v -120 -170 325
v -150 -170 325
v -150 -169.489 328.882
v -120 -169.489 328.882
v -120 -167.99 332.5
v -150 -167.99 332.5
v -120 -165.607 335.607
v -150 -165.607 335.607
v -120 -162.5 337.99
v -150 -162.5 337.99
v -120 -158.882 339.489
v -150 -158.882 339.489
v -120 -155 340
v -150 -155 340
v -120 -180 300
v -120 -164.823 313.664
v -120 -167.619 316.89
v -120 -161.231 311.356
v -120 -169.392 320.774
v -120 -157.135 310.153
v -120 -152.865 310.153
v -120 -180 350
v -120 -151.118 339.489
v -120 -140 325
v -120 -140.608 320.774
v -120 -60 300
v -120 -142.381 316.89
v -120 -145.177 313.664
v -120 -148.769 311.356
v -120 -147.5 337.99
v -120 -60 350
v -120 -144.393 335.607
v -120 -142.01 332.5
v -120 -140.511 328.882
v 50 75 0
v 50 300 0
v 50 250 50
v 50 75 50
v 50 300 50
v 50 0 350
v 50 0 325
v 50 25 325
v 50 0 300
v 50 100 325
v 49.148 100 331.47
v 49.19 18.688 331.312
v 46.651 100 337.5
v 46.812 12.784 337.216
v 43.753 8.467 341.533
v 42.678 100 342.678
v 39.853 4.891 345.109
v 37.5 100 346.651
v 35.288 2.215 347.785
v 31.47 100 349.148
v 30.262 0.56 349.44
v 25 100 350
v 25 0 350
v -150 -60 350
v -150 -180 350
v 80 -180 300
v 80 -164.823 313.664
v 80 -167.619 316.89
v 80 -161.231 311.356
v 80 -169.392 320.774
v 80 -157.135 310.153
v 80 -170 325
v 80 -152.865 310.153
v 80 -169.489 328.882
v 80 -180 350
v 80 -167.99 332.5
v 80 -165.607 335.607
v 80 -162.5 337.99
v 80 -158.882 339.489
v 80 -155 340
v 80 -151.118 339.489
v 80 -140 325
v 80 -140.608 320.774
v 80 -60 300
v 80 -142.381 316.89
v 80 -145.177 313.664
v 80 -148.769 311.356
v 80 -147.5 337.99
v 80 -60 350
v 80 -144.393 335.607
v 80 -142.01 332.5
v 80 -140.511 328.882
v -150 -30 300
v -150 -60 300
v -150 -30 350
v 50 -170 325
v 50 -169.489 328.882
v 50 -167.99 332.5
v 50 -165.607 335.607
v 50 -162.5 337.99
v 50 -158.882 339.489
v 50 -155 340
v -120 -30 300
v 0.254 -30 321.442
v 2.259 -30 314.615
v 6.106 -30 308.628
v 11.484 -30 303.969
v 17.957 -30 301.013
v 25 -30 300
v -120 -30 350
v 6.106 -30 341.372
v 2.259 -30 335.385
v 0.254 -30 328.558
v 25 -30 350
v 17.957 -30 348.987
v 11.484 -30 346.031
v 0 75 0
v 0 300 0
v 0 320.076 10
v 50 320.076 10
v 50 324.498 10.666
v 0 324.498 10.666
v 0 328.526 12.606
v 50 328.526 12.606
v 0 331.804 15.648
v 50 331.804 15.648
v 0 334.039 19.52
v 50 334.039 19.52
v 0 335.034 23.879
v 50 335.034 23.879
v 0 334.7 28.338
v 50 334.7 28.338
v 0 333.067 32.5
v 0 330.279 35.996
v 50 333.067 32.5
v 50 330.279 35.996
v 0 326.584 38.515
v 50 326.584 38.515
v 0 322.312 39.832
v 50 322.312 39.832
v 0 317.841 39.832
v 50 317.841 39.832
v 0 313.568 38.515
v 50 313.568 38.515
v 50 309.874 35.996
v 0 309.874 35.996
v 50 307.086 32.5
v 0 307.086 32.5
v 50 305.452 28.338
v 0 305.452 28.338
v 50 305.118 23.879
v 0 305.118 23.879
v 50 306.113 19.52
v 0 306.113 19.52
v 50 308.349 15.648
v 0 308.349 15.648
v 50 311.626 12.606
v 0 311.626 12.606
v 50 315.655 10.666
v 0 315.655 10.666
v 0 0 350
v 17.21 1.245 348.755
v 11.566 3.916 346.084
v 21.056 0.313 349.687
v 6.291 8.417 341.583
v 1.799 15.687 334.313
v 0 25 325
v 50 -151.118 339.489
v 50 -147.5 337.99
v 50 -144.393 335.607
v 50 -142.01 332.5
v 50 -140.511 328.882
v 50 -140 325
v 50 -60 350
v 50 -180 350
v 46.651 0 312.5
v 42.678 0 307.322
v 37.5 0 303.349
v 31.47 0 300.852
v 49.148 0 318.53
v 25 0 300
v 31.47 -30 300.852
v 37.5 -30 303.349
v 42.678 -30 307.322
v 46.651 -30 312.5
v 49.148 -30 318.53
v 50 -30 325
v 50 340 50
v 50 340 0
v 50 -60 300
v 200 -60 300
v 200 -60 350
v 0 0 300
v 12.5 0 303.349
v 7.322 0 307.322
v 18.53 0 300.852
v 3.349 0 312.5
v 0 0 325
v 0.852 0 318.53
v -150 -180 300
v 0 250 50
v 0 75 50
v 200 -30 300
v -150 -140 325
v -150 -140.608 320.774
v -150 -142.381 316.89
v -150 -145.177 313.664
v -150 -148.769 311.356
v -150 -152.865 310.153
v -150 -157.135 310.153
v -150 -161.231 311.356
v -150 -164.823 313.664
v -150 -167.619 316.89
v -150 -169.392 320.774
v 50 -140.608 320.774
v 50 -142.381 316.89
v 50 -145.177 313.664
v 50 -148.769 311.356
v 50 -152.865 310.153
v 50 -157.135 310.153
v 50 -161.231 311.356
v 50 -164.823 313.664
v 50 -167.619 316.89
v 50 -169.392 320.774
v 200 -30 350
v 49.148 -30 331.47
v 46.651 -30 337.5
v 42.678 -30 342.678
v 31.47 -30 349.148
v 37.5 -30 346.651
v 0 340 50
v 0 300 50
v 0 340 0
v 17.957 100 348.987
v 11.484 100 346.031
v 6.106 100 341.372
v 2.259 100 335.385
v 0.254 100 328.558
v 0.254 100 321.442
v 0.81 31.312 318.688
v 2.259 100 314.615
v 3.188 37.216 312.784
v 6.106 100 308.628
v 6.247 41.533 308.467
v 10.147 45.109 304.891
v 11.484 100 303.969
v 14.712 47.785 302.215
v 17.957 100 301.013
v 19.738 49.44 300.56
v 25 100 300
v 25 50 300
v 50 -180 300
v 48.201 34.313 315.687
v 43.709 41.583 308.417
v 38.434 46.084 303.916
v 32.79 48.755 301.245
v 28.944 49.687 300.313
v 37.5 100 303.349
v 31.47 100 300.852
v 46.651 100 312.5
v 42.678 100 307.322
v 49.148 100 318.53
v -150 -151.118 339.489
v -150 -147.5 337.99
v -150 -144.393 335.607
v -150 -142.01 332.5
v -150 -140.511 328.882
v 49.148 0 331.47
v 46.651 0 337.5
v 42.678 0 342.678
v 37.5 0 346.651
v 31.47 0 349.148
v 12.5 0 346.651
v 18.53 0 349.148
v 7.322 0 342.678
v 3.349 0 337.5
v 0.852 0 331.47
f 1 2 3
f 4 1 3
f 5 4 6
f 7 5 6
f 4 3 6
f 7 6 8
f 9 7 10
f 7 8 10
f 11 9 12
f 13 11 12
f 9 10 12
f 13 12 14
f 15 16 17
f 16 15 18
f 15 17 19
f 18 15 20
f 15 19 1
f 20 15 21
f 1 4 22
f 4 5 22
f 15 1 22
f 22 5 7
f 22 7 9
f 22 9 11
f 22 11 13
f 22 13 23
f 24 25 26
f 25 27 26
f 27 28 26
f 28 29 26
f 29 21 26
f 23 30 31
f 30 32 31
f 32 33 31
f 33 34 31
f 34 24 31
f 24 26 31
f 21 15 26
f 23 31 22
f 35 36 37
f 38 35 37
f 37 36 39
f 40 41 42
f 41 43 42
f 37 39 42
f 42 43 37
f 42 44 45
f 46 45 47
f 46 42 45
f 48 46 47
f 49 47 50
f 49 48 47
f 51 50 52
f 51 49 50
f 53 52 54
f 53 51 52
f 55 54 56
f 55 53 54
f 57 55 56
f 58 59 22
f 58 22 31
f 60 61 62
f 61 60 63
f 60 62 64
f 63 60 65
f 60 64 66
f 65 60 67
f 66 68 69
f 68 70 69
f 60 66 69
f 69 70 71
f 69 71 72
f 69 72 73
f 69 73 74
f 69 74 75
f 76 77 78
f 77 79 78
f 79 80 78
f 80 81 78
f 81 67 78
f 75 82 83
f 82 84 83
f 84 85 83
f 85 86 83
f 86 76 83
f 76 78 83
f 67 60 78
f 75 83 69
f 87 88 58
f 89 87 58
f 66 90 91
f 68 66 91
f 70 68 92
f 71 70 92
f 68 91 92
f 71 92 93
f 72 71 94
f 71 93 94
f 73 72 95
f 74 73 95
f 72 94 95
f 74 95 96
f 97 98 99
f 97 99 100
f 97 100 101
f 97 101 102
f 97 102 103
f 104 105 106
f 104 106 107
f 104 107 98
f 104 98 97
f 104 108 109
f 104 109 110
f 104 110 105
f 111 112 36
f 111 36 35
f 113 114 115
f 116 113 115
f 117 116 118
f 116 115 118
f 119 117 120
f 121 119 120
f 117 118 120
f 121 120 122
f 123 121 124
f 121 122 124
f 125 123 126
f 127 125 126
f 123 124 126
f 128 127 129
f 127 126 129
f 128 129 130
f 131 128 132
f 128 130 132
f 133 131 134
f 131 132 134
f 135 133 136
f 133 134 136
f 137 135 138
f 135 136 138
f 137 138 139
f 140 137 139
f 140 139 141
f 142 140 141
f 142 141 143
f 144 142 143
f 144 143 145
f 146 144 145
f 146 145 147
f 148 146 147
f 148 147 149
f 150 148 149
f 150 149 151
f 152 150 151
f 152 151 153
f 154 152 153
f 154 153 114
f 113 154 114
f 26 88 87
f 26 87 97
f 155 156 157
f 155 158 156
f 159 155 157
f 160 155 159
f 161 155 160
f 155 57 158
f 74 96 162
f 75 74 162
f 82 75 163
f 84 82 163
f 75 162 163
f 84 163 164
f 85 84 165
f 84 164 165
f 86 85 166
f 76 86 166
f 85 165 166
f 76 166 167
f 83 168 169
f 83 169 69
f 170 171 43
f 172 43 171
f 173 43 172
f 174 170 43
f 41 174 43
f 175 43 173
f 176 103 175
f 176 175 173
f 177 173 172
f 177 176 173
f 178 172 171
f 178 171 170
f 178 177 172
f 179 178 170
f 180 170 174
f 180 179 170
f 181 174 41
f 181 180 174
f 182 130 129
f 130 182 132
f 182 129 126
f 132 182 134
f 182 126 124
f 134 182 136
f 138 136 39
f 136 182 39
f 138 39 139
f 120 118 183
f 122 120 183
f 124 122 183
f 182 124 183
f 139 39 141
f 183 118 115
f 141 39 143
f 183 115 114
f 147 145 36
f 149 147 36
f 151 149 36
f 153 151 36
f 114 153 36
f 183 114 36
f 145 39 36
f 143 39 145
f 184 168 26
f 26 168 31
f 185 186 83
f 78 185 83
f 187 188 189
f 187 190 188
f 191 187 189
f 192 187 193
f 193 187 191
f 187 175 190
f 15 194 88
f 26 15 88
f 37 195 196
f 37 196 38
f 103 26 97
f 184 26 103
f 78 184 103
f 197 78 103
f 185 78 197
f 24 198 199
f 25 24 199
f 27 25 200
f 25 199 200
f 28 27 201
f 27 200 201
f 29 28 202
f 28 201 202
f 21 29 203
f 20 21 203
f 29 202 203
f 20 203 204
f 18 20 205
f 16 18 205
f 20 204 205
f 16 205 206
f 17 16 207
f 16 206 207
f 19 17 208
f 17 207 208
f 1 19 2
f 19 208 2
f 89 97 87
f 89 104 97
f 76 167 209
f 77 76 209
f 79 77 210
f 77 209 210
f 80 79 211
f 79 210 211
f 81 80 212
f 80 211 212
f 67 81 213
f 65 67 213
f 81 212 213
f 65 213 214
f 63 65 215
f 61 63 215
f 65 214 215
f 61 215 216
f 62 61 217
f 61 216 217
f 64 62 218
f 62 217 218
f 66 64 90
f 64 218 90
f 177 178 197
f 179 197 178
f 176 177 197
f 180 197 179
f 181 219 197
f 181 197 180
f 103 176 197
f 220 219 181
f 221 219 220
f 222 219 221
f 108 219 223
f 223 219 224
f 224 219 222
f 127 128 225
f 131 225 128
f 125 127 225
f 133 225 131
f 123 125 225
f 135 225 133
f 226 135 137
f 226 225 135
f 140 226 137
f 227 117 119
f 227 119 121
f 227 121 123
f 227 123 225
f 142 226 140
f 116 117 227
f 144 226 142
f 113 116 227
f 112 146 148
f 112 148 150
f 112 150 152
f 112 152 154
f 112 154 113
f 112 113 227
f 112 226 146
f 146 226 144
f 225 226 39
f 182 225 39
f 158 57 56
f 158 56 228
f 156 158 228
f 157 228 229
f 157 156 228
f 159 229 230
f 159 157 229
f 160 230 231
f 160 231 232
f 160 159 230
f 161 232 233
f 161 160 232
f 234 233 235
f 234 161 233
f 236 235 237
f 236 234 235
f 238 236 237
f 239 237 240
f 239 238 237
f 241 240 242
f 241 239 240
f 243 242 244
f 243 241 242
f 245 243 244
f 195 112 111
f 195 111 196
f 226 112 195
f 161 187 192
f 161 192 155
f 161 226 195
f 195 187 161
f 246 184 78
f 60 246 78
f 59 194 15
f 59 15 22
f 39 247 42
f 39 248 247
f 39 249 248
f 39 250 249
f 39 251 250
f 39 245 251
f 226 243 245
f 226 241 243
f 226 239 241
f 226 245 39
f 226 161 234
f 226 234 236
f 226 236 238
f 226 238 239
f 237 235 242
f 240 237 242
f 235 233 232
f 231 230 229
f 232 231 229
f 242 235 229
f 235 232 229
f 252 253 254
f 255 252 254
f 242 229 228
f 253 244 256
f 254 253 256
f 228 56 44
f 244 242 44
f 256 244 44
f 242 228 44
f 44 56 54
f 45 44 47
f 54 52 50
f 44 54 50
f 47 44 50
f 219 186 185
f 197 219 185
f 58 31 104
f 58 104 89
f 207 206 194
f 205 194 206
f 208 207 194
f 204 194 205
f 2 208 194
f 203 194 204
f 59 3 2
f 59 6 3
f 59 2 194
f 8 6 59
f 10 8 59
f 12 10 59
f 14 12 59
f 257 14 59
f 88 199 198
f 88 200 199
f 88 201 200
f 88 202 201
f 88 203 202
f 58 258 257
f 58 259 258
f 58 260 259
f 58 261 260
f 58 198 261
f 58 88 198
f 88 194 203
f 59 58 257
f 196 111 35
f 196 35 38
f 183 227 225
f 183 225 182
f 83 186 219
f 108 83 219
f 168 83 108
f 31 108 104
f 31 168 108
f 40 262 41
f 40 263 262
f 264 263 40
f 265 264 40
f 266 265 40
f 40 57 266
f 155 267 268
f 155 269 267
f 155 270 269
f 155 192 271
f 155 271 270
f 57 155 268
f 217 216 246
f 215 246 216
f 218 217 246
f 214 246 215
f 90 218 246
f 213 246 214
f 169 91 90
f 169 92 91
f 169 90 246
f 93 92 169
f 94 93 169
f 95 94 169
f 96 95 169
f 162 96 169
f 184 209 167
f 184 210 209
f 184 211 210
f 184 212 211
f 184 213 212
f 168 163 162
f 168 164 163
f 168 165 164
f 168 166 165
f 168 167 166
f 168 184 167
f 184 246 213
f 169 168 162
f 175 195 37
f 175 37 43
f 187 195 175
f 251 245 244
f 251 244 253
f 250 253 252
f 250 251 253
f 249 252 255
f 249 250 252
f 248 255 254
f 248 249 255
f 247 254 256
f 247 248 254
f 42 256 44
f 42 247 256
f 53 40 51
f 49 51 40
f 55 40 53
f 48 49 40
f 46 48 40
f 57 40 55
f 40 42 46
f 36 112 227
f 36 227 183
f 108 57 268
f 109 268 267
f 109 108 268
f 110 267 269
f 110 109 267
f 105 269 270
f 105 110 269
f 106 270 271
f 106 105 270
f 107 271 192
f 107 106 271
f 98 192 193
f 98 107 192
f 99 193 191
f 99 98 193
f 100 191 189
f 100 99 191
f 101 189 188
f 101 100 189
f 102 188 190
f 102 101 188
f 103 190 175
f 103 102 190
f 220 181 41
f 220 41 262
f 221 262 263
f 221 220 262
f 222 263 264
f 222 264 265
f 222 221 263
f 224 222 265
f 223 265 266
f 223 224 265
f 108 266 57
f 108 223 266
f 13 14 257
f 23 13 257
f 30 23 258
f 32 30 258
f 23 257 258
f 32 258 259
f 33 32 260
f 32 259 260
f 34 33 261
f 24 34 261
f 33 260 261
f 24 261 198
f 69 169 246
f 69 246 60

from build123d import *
from build123d.topology import SkipClean

# Parameters (mm, degrees)
SKETCH1_W            = 50
SKETCH1_H            = 300
BOSS_EXTRUDE1_DEPTH  = 50
SKETCH2_W            = 50
SKETCH2_H            = 75
CUT_EXTRUDE3_DEPTH   = 50
BOSS_EXTRUDE2_DEPTH  = 50
BOSS_EXTRUDE3_DEPTH  = 100
BOSS_EXTRUDE4_START  = 60
BOSS_EXTRUDE4_DEPTH  = 60
BOSS_EXTRUDE12_DEPTH = 30
SKETCH13_W           = 50
SKETCH13_H           = 150
BOSS_EXTRUDE13_DEPTH = 30
SKETCH14_W           = 30
SKETCH14_H           = 50
BOSS_EXTRUDE14_DEPTH = 120
CUT_EXTRUDE4_DEPTH   = 290
SKETCH17_W           = 50
SKETCH17_H           = 44.956964621
CUT_EXTRUDE5_DEPTH   = 50
SKETCH18_W           = 50
SKETCH18_H           = 50
BOSS_EXTRUDE15_DEPTH = 40
SKETCH19_R           = 15
CUT_EXTRUDE6_DEPTH   = 90


with BuildPart() as part:
    # Sketch1 → Boss-Extrude1 (new body)
    with BuildSketch(Plane.XY):
        with Locations((25, 150)):
            Rectangle(SKETCH1_W, SKETCH1_H)
    extrude(amount=BOSS_EXTRUDE1_DEPTH)

    # Sketch2 → Cut-Extrude3 (cut)
    with BuildSketch(Plane.ZY):
        with Locations((25, 37.5)):
            Rectangle(SKETCH2_W, SKETCH2_H)
    extrude(amount=-CUT_EXTRUDE3_DEPTH, mode=Mode.SUBTRACT)

    # Sketch4 → Boss-Extrude2 (add)
    with BuildSketch(Plane.ZY):
        Polygon((350, 0), (50, 300), (0, 344.956964621), (0, 300), (300, 0), align=None)
    extrude(amount=-BOSS_EXTRUDE2_DEPTH)

    # Sketch5 → Boss-Extrude3 (add)
    with BuildSketch(Plane.XZ):
        with BuildLine():
            ThreePointArc((50, 325), (42.67766953, 342.67766953), (25, 350))
            Line((25, 350), (25, 300))
            ThreePointArc((25, 300), (42.67766953, 307.32233047), (50, 325))
        make_face()
        with BuildLine():
            Line((25, 300), (25, 350))
            ThreePointArc((25, 350), (0, 325), (25, 300))
        make_face()
    extrude(amount=-BOSS_EXTRUDE3_DEPTH)

    # Sketch6 → Boss-Extrude4 (add)
    with BuildSketch(Plane.XZ.offset(BOSS_EXTRUDE4_START)):
        with BuildLine():
            ThreePointArc((50, 325), (42.67766953, 342.67766953), (25, 350))
            Line((25, 350), (25, 300))
            ThreePointArc((25, 300), (42.67766953, 307.32233047), (50, 325))
        make_face()
        with BuildLine():
            Line((25, 300), (25, 350))
            ThreePointArc((25, 350), (0, 325), (25, 300))
        make_face()
    extrude(amount=-BOSS_EXTRUDE4_DEPTH)

    # Sketch9 → Boss-Extrude12 (add)
    with BuildSketch(Plane.XZ.offset(60)):
        Polygon((50, 300), (0, 300), (-150, 300), (-150, 350), (0, 350), (50, 350), (200, 350), (200, 300), align=None)
    extrude(amount=-BOSS_EXTRUDE12_DEPTH)

    # Sketch13 → Boss-Extrude13 (add)
    with SkipClean():  # the faces are left unmerged after this step: merging them gives an invalid solid
        with BuildSketch(Plane.ZY.offset(150)):
            with Locations((325, -105)):
                Rectangle(SKETCH13_W, SKETCH13_H)
        extrude(amount=-BOSS_EXTRUDE13_DEPTH)

    # Sketch14 → Boss-Extrude14 (add)
    with SkipClean():  # the faces are left unmerged after this step: merging them gives an invalid solid
        with BuildSketch(Plane.XZ.offset(60)):
            with Locations((65, 325)):
                Rectangle(SKETCH14_W, SKETCH14_H)
        extrude(amount=BOSS_EXTRUDE14_DEPTH)

    # Sketch15 → Cut-Extrude4 (cut)
    with SkipClean():  # the faces are left unmerged after this step: merging them gives an invalid solid
        with BuildSketch(Plane.ZY.offset(150)):
            with BuildLine():
                ThreePointArc((325, -140), (310, -155), (325, -170))
                Line((325, -170), (325, -140))
            make_face()
            with BuildLine():
                Line((325, -140), (325, -170))
                ThreePointArc((325, -170), (335.606601718, -165.606601718), (340, -155))
                ThreePointArc((340, -155), (335.606601718, -144.393398282), (325, -140))
            make_face()
        extrude(amount=-CUT_EXTRUDE4_DEPTH, mode=Mode.SUBTRACT)

    # Sketch17 → Cut-Extrude5 (cut)
    with SkipClean():  # the faces are left unmerged after this step: merging them gives an invalid solid
        with BuildSketch(Plane.XY):
            with Locations((25, 322.47848231)):
                Rectangle(SKETCH17_W, SKETCH17_H)
        extrude(amount=CUT_EXTRUDE5_DEPTH, mode=Mode.SUBTRACT)

    # Sketch18 → Boss-Extrude15 (add)
    with SkipClean():  # the faces are left unmerged after this step: merging them gives an invalid solid
        with BuildSketch(Plane(origin=(0, 300, 0), x_dir=(1, 0, 0), z_dir=(0, 1, 0))):
            with Locations((25, -25)):
                Rectangle(SKETCH18_W, SKETCH18_H)
        extrude(amount=BOSS_EXTRUDE15_DEPTH)

    # Sketch19 → Cut-Extrude6 (cut)
    with SkipClean():  # the faces are left unmerged after this step: merging them gives an invalid solid
        with BuildSketch(Plane(origin=(50, 0, 0), x_dir=(0, 0, -1), z_dir=(1, 0, 0))):
            with Locations((-25, 320.076220665)):
                Circle(SKETCH19_R)
        extrude(amount=-CUT_EXTRUDE6_DEPTH, mode=Mode.SUBTRACT)


solid = part.part
